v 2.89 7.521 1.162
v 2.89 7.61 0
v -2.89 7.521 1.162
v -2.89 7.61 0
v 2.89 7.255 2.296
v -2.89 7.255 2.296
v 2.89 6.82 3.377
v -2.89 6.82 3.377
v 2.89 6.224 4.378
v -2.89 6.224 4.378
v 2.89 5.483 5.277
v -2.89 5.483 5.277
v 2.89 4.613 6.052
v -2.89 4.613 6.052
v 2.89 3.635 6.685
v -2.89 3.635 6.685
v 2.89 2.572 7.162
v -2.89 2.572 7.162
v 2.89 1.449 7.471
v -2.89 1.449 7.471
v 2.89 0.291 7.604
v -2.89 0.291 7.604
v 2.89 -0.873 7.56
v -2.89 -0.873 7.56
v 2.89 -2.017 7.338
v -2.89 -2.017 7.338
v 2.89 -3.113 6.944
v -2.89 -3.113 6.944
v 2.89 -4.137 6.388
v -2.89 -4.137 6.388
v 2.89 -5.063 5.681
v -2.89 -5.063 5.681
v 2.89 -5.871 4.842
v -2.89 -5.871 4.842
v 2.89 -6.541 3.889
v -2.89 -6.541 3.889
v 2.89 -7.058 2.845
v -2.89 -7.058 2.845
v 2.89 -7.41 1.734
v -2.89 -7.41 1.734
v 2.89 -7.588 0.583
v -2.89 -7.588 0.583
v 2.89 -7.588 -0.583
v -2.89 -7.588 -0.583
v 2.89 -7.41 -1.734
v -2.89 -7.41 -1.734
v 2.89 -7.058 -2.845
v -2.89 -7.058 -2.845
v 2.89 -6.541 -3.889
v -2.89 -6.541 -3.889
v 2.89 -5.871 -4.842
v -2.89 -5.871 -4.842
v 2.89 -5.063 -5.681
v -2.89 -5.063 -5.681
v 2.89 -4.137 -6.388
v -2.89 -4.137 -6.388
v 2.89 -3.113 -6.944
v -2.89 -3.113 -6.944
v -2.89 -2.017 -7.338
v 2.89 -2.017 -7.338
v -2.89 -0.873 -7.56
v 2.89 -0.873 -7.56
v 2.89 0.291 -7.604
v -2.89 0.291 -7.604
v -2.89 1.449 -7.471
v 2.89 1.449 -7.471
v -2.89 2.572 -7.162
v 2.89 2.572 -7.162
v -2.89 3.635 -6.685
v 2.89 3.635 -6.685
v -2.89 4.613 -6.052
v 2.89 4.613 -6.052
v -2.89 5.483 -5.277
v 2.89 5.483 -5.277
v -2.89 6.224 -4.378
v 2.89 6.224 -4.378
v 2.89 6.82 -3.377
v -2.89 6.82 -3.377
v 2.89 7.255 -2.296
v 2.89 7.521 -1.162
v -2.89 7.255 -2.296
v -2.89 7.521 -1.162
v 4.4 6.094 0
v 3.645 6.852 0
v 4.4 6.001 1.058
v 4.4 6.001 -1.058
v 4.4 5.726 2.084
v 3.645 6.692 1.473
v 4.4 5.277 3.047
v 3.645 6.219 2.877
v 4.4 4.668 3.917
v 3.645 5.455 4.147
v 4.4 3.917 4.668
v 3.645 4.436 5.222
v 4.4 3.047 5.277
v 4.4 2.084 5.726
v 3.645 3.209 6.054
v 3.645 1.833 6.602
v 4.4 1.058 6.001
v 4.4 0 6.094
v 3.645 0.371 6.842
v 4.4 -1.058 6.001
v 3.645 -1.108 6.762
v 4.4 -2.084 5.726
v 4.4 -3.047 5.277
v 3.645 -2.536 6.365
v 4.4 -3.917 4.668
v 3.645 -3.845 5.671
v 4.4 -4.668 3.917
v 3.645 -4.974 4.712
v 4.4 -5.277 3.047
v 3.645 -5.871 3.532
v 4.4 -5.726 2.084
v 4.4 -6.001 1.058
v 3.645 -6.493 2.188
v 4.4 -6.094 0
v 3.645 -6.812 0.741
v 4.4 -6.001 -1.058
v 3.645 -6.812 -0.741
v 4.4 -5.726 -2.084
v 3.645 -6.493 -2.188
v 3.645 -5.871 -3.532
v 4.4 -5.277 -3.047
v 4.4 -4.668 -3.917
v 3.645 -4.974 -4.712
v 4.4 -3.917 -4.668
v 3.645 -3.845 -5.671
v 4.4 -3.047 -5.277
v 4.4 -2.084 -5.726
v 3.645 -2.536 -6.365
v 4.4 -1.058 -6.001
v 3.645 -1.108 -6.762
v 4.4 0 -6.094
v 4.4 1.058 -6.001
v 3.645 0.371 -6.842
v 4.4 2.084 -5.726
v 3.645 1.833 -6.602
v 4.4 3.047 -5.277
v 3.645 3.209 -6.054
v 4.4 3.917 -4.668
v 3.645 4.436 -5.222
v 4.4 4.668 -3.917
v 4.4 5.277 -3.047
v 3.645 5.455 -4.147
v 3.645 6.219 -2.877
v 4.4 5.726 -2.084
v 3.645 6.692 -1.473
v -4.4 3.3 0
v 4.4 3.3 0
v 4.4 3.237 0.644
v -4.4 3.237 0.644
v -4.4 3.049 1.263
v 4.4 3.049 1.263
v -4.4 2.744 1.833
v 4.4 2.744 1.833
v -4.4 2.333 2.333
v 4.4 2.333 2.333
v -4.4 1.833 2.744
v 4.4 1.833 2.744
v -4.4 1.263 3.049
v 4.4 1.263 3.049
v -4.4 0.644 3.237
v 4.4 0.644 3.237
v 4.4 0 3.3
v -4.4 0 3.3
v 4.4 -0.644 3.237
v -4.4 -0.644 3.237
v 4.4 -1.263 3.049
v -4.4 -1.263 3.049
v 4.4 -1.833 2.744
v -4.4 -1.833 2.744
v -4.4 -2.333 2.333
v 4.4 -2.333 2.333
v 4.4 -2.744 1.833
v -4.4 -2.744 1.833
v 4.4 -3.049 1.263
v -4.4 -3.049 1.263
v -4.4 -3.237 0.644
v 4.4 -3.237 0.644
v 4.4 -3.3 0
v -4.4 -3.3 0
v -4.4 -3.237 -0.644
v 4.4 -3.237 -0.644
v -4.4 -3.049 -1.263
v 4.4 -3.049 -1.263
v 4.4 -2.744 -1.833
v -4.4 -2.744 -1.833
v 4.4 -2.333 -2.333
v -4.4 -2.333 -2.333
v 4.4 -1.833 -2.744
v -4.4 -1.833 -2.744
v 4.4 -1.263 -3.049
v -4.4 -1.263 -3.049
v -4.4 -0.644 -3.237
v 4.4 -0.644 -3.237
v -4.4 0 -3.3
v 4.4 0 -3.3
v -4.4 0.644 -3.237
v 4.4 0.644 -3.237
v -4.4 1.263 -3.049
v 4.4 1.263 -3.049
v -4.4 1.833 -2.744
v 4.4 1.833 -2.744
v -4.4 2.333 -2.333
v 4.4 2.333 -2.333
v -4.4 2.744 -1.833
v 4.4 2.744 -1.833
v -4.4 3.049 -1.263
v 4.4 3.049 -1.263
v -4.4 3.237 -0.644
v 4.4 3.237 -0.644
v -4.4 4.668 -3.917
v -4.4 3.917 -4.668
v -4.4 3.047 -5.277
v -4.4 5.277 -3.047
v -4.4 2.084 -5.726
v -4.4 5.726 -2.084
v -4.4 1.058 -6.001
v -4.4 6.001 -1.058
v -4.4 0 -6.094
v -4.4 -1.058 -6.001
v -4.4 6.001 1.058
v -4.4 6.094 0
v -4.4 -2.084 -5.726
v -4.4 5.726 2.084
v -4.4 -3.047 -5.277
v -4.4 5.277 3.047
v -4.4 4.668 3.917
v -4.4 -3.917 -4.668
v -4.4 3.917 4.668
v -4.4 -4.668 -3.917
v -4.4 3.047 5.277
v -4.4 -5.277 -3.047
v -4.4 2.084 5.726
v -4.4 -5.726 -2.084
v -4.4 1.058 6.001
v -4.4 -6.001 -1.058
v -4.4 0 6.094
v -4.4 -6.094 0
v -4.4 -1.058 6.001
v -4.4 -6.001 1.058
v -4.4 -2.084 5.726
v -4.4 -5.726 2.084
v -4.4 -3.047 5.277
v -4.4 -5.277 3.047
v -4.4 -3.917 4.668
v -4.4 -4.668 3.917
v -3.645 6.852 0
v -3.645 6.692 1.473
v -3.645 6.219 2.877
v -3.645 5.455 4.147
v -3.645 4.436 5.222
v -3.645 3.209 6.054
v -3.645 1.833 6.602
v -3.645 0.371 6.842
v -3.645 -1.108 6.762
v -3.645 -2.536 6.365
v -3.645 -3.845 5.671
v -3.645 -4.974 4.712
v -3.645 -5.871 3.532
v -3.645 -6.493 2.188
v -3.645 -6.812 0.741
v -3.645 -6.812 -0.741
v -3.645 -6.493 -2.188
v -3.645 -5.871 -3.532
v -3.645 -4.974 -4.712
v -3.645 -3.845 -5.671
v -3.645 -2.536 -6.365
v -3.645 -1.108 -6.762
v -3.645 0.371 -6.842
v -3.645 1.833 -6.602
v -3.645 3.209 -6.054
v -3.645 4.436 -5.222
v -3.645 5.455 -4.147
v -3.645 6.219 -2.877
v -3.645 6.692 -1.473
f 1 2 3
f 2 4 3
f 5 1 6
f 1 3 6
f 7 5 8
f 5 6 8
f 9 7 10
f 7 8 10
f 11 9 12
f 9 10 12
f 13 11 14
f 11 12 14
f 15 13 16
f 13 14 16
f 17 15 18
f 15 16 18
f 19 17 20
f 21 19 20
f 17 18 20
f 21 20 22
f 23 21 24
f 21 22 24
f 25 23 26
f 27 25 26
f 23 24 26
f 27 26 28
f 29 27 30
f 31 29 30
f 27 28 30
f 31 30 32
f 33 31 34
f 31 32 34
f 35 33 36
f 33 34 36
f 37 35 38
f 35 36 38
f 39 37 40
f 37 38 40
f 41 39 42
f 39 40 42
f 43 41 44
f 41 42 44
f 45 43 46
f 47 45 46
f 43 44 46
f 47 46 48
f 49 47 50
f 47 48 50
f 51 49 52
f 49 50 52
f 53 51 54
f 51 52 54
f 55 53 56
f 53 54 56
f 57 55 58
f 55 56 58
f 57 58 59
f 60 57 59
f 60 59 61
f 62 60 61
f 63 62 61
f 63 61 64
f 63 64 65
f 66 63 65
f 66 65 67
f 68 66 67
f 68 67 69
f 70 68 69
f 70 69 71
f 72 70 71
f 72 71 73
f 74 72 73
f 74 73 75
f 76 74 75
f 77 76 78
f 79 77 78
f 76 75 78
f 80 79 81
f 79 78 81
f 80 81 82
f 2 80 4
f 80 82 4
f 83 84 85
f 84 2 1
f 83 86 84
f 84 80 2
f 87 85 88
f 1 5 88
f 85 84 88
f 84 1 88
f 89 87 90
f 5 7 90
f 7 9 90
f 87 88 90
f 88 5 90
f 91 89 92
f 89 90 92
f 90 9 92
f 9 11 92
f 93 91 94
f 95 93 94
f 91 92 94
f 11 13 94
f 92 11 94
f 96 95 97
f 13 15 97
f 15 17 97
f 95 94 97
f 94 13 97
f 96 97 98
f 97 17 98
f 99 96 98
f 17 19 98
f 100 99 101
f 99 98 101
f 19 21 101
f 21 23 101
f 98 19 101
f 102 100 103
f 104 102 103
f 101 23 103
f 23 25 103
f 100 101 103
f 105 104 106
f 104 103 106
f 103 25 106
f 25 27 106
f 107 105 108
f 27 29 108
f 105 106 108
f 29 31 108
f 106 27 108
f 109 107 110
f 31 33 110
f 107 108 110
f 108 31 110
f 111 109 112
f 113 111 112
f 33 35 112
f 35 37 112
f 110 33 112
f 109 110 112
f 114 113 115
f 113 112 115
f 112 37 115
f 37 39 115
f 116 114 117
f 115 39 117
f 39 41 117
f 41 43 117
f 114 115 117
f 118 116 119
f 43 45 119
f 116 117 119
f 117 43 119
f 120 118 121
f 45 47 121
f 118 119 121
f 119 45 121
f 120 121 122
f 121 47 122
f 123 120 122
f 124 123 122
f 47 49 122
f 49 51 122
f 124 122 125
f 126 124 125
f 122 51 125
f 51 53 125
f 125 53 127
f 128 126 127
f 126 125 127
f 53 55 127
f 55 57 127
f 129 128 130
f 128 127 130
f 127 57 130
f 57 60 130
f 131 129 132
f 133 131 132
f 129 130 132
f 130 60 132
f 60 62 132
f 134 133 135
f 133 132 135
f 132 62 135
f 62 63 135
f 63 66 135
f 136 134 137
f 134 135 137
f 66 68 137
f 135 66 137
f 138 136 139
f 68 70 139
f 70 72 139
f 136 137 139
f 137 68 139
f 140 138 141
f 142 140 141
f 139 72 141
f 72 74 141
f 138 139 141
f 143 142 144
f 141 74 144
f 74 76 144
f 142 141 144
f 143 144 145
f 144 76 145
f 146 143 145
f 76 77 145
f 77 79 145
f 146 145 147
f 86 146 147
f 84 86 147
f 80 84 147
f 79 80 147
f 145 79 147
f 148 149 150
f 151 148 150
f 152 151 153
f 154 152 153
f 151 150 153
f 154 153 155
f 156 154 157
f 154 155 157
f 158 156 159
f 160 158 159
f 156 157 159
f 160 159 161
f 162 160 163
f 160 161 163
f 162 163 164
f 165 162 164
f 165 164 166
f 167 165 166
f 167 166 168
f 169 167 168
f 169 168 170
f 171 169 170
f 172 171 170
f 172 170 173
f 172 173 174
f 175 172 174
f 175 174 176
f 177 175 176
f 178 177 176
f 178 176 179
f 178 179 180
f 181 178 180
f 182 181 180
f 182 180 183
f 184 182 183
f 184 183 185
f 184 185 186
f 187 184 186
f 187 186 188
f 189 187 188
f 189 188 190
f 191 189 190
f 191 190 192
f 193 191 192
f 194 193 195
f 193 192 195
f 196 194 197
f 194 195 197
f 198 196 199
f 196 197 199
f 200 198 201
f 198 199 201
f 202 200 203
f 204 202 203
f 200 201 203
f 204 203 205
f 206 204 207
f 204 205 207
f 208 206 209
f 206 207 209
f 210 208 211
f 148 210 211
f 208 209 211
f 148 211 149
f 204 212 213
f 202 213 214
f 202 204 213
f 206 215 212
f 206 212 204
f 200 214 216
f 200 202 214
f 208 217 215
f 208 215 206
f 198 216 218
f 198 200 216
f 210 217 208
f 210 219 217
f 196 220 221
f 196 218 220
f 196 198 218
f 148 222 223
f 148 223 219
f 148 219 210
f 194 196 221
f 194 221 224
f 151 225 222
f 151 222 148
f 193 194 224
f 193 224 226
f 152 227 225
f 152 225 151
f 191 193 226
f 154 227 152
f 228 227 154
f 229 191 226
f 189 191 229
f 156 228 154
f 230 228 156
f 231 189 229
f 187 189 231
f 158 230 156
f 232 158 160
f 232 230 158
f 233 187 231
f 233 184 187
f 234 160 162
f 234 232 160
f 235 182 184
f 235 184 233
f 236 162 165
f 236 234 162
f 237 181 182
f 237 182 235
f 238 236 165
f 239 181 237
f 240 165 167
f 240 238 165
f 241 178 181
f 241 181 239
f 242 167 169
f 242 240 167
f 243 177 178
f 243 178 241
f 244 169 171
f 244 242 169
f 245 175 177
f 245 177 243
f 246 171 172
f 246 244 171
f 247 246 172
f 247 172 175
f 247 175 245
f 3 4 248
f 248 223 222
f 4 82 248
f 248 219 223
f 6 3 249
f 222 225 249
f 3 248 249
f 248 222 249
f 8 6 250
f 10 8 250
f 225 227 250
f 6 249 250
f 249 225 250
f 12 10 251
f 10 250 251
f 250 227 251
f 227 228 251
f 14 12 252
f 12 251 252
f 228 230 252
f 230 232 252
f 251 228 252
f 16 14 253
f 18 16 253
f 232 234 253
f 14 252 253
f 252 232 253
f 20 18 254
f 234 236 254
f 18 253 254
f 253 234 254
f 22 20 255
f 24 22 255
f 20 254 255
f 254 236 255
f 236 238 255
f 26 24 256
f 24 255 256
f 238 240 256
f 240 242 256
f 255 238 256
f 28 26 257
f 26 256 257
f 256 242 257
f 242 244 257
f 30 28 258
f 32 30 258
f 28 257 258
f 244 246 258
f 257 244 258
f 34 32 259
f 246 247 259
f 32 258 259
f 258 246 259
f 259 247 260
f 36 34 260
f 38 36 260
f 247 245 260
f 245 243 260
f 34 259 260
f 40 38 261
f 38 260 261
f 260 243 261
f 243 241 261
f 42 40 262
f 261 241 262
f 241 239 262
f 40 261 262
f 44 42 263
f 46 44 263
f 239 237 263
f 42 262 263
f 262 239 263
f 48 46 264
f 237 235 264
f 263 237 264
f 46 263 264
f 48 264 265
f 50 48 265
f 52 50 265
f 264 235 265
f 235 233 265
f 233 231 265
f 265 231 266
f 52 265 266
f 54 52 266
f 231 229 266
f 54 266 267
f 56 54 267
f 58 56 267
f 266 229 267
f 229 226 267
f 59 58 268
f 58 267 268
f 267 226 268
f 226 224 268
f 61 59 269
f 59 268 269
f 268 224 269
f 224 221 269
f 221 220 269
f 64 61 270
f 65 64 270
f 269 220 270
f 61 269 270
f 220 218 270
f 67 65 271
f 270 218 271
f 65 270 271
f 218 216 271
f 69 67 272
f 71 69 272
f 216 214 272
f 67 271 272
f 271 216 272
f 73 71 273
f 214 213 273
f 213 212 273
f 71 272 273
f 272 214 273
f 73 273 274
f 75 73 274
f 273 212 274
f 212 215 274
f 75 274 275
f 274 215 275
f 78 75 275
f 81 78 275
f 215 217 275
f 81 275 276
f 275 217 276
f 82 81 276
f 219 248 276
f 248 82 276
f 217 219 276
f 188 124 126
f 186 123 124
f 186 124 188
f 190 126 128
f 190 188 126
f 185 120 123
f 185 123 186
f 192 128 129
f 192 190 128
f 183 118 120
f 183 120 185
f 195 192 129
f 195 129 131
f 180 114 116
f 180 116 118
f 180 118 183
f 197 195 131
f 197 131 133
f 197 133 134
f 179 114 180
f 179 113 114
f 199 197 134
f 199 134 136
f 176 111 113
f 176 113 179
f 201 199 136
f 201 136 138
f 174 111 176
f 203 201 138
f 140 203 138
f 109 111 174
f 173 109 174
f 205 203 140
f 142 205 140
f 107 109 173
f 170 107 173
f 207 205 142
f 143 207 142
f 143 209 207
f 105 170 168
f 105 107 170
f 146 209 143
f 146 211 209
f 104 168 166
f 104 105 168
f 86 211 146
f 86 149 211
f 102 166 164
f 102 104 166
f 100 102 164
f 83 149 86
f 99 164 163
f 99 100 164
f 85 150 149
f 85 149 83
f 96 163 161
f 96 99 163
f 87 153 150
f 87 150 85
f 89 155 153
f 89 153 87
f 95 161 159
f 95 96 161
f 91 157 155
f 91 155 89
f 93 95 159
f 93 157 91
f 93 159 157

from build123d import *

# Parameters (mm, degrees)
F1_DEPTH      = 4.9
F1_DEPTH_BACK = 3.9
F2_R          = 4.32
F3_DEPTH      = 8.8
F4_D          = 6.6


with BuildPart() as f5:
    # F0 (on Top) → F5 (revolve)
    with BuildSketch(Plane.XY):
        Polygon((-0.5, 4.99), (0, 4.99), (0.5, 4.99), (4.4, 4.99), (4.4, 6.0935897653), (2.89, 7.61), (0, 7.61), (-2.89, 7.61), (-4.4, 6.0935897653), (-4.4, 4.99), align=None)
        Polygon((0.5, 4.99), (0, 4.99), (-0.5, 4.99), (-0.5, 4.32), (0, 4.32), (0.5, 4.32), align=None)
    revolve(axis=Axis((2.2, 0, 0), (1, 0, 0)))

    # F1 (add, two sides): a face of the model
    f1_faces = [f5.faces().sort_by_distance(p)[0] for p in [
        (-0.5, -4.8488614865, 0),
    ]]
    extrude(f1_faces, amount=-F1_DEPTH)
    extrude(f1_faces, amount=F1_DEPTH_BACK)

    # F2 (on face) → F3 (join, through all)
    with BuildSketch(Plane(origin=(-4.4, 0, 0), x_dir=(0, -1, 0), z_dir=(-1, 0, 0))):
        Circle(F2_R)
    extrude(amount=-F3_DEPTH)

    # F4 (through all)
    with Locations(Plane(origin=(-4.4, 0, 0), x_dir=(0, -1, 0), z_dir=(-1, 0, 0))):
        with Locations((0, 0)):
            Hole(F4_D / 2)


solid = f5.part
